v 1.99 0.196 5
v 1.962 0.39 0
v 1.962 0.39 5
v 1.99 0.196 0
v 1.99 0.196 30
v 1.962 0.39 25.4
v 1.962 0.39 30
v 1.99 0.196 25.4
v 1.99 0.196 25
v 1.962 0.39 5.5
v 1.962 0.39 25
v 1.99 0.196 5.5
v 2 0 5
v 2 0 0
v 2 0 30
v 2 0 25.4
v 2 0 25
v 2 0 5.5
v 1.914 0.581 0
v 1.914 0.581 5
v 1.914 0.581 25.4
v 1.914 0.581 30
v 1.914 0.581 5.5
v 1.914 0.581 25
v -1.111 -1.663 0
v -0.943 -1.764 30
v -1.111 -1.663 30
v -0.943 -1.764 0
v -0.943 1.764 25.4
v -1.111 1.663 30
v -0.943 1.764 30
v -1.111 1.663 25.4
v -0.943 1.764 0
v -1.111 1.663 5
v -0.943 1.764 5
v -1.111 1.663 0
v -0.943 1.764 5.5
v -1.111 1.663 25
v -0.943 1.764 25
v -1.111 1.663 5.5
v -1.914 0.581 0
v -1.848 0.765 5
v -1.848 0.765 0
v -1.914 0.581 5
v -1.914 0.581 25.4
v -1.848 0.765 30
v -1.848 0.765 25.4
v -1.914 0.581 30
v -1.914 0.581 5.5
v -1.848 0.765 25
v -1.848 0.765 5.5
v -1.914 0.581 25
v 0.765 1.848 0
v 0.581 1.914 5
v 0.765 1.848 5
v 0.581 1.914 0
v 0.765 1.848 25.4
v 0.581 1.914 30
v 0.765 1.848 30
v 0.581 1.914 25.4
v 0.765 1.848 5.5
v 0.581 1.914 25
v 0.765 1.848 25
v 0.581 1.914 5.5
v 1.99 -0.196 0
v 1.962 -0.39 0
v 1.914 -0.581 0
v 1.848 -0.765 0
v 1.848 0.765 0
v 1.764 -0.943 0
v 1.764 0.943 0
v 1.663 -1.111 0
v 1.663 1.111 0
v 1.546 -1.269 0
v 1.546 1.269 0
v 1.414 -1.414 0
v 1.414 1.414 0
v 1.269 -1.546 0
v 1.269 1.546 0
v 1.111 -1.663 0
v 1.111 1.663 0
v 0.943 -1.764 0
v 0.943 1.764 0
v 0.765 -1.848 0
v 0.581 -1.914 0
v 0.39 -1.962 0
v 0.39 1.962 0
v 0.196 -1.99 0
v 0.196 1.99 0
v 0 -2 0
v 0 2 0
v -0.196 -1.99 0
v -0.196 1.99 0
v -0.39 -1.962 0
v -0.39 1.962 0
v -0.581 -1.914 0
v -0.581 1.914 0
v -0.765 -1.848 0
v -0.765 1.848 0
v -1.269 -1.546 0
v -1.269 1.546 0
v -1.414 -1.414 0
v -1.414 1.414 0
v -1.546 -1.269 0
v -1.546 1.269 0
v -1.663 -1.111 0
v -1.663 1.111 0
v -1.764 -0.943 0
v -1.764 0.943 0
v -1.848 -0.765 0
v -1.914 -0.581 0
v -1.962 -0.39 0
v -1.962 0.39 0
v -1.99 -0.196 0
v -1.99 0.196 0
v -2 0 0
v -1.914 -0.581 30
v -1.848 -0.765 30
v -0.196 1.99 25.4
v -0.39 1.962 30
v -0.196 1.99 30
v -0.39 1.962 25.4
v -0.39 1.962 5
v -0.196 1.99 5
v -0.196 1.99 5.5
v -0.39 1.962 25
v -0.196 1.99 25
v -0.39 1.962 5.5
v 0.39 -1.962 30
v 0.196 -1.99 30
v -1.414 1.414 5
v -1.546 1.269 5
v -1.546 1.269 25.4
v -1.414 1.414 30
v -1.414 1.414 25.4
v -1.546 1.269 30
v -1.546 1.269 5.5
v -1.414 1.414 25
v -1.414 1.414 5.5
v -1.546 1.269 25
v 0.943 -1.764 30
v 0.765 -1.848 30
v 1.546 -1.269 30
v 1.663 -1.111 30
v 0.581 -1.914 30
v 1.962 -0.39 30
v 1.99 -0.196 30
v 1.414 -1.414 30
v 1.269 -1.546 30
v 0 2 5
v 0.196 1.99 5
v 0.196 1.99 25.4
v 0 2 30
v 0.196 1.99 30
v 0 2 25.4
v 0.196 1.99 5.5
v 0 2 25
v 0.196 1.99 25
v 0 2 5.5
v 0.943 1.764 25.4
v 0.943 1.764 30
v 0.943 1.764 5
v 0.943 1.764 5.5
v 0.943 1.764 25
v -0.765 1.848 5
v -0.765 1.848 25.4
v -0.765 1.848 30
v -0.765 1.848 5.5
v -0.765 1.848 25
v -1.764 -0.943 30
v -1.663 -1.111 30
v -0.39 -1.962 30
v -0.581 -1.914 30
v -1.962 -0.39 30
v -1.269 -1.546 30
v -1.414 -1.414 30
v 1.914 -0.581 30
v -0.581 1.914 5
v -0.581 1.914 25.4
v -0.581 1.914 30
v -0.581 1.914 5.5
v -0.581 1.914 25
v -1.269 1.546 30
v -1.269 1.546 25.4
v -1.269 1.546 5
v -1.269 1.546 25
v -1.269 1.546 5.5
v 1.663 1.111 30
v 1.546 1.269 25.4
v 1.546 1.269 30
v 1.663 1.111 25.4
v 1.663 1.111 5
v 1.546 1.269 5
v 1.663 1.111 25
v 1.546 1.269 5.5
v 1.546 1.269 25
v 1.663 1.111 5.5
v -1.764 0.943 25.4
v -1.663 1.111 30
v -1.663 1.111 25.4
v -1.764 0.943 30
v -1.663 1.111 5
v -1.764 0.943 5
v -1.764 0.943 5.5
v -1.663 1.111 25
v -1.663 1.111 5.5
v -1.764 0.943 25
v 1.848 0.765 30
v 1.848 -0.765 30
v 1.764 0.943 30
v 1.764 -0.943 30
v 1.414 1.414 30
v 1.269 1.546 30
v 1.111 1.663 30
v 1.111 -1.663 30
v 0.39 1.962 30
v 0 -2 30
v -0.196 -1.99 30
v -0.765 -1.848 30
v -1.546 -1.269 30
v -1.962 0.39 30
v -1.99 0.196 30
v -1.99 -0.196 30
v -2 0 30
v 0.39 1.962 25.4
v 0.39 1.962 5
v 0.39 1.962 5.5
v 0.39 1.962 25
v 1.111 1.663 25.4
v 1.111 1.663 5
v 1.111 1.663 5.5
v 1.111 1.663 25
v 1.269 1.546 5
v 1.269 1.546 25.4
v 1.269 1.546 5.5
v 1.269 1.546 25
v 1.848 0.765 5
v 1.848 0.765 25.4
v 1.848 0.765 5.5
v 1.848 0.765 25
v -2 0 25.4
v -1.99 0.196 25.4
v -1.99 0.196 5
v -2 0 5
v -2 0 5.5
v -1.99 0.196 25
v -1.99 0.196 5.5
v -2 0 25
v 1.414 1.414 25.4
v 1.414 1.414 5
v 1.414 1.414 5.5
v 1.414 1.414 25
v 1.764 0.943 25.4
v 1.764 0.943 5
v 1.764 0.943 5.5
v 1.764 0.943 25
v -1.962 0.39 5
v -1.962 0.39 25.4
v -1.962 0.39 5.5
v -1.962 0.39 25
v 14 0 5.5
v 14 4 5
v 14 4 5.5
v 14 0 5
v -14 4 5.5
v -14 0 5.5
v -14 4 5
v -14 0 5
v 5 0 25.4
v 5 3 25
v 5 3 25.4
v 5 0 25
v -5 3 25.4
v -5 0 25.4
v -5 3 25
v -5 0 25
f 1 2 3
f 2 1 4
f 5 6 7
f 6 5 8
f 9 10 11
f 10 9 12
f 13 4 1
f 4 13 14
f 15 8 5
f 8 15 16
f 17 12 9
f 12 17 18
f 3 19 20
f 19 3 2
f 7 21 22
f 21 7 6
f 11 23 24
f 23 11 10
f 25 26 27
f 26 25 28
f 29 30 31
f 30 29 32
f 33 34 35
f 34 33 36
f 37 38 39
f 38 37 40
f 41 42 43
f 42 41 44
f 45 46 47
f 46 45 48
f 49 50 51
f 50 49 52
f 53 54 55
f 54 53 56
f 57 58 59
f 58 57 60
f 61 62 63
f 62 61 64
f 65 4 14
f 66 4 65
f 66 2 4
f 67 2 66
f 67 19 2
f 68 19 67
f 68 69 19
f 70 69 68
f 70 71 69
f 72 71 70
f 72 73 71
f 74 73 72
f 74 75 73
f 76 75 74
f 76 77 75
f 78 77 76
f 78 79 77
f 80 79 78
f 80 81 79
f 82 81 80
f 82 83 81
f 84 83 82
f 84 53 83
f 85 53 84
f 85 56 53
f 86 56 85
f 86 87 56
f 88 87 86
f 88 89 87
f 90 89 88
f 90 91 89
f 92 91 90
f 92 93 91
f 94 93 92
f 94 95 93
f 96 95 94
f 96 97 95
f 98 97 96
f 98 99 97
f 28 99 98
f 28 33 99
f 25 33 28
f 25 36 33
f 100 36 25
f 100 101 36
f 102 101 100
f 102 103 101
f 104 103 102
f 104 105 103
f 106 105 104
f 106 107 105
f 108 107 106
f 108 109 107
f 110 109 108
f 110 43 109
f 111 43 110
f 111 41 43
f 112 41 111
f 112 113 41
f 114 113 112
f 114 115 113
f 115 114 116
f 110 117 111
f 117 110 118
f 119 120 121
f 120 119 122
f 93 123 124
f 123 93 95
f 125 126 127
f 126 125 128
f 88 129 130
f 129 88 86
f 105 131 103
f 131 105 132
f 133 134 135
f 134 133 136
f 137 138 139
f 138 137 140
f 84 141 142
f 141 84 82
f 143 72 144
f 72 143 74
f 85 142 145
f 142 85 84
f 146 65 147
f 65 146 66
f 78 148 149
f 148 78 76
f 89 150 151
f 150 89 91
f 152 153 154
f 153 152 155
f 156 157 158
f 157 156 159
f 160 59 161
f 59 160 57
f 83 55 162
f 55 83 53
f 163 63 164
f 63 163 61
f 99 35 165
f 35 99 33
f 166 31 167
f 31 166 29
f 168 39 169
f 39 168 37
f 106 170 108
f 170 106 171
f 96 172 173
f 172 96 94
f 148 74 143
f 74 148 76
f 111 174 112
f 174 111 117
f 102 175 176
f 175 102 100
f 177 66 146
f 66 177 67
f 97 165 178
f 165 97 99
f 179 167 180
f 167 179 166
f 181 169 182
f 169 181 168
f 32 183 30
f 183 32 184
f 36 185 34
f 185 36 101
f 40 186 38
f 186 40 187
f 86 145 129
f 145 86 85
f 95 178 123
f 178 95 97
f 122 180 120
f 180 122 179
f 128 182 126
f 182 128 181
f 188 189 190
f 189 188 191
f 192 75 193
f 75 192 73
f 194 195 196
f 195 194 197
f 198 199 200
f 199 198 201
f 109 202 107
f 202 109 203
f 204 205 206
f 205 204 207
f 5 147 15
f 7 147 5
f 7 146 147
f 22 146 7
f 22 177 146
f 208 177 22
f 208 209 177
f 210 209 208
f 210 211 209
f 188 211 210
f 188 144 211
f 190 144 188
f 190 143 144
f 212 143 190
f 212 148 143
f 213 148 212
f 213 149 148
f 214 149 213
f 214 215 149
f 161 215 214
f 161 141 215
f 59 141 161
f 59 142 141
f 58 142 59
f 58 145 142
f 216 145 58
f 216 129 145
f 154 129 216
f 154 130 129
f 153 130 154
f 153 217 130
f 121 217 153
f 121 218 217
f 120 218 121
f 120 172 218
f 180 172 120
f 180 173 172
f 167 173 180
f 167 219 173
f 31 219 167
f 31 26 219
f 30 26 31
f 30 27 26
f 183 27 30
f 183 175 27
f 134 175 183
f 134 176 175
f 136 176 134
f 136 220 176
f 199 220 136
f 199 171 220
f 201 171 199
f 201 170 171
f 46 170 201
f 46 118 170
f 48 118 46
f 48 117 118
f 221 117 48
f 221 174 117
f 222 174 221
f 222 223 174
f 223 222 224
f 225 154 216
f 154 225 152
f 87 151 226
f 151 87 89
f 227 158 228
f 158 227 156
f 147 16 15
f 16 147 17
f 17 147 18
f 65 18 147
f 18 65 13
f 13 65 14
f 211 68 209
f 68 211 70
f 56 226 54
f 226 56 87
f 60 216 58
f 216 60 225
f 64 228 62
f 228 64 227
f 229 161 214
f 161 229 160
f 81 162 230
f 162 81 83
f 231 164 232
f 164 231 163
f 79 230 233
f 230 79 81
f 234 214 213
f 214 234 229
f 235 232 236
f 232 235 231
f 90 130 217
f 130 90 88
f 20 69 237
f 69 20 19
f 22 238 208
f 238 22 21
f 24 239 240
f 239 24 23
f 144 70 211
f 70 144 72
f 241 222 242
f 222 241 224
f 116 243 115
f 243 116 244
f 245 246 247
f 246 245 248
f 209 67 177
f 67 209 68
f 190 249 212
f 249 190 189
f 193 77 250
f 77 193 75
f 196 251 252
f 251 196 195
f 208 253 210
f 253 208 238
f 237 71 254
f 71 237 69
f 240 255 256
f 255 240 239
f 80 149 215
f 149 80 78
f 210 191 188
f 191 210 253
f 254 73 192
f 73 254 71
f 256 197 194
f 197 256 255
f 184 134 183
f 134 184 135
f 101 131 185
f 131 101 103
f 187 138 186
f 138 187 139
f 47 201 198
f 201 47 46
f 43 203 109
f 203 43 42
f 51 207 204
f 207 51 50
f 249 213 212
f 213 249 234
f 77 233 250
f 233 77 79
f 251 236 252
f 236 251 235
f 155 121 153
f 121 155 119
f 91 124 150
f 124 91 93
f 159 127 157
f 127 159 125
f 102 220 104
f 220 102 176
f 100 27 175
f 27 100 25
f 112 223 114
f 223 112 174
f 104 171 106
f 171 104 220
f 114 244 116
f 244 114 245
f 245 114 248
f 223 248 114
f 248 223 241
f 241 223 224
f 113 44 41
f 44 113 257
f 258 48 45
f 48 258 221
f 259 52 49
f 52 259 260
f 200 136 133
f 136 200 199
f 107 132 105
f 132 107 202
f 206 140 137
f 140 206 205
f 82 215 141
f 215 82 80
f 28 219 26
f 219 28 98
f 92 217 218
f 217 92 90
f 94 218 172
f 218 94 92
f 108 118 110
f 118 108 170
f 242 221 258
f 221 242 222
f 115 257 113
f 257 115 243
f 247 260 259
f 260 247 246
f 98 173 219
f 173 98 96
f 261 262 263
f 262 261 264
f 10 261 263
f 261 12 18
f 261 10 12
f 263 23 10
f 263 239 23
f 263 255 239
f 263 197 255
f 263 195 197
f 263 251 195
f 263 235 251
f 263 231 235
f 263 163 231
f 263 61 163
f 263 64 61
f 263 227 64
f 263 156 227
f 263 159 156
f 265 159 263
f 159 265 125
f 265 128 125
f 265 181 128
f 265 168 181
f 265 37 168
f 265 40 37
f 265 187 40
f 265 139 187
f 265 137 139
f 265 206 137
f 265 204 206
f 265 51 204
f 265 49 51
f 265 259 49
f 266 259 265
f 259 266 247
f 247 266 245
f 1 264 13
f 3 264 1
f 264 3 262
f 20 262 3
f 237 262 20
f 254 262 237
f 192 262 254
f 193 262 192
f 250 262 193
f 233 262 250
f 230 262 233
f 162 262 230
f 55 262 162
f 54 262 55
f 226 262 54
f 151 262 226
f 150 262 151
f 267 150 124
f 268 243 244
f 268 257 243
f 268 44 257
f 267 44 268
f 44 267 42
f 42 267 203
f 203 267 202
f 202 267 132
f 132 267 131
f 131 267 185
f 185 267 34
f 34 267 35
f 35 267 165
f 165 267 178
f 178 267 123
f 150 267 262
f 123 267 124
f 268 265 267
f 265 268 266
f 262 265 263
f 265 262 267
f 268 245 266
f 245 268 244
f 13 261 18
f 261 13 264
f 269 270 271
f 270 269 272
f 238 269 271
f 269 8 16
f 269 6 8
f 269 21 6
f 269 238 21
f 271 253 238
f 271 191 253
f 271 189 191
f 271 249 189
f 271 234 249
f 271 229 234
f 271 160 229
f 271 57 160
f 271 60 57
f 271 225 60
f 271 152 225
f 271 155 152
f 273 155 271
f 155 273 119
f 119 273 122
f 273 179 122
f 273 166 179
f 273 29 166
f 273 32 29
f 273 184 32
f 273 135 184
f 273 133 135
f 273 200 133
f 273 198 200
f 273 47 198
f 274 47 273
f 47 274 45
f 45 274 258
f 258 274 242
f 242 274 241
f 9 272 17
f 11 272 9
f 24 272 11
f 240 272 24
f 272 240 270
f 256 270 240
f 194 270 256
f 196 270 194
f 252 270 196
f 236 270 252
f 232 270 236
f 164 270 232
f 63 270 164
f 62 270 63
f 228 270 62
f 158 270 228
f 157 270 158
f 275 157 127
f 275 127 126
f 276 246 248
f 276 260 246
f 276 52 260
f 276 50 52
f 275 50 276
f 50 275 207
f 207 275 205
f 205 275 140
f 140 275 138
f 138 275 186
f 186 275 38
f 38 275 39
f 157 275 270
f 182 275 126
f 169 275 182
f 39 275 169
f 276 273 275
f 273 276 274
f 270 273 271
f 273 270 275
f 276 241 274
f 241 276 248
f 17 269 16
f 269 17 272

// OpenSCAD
// AUTO-GENERATED BY cad-agent FULL SYSTEM TEST

$fn = 64;

// Fuselage
translate([0,0,0])
cylinder(h=30, r=2);

// Wing
translate([-14,0,5])
cube([28,4,0.5]);

// Tail
translate([-5,0,25])
cube([10,3,0.4]);
